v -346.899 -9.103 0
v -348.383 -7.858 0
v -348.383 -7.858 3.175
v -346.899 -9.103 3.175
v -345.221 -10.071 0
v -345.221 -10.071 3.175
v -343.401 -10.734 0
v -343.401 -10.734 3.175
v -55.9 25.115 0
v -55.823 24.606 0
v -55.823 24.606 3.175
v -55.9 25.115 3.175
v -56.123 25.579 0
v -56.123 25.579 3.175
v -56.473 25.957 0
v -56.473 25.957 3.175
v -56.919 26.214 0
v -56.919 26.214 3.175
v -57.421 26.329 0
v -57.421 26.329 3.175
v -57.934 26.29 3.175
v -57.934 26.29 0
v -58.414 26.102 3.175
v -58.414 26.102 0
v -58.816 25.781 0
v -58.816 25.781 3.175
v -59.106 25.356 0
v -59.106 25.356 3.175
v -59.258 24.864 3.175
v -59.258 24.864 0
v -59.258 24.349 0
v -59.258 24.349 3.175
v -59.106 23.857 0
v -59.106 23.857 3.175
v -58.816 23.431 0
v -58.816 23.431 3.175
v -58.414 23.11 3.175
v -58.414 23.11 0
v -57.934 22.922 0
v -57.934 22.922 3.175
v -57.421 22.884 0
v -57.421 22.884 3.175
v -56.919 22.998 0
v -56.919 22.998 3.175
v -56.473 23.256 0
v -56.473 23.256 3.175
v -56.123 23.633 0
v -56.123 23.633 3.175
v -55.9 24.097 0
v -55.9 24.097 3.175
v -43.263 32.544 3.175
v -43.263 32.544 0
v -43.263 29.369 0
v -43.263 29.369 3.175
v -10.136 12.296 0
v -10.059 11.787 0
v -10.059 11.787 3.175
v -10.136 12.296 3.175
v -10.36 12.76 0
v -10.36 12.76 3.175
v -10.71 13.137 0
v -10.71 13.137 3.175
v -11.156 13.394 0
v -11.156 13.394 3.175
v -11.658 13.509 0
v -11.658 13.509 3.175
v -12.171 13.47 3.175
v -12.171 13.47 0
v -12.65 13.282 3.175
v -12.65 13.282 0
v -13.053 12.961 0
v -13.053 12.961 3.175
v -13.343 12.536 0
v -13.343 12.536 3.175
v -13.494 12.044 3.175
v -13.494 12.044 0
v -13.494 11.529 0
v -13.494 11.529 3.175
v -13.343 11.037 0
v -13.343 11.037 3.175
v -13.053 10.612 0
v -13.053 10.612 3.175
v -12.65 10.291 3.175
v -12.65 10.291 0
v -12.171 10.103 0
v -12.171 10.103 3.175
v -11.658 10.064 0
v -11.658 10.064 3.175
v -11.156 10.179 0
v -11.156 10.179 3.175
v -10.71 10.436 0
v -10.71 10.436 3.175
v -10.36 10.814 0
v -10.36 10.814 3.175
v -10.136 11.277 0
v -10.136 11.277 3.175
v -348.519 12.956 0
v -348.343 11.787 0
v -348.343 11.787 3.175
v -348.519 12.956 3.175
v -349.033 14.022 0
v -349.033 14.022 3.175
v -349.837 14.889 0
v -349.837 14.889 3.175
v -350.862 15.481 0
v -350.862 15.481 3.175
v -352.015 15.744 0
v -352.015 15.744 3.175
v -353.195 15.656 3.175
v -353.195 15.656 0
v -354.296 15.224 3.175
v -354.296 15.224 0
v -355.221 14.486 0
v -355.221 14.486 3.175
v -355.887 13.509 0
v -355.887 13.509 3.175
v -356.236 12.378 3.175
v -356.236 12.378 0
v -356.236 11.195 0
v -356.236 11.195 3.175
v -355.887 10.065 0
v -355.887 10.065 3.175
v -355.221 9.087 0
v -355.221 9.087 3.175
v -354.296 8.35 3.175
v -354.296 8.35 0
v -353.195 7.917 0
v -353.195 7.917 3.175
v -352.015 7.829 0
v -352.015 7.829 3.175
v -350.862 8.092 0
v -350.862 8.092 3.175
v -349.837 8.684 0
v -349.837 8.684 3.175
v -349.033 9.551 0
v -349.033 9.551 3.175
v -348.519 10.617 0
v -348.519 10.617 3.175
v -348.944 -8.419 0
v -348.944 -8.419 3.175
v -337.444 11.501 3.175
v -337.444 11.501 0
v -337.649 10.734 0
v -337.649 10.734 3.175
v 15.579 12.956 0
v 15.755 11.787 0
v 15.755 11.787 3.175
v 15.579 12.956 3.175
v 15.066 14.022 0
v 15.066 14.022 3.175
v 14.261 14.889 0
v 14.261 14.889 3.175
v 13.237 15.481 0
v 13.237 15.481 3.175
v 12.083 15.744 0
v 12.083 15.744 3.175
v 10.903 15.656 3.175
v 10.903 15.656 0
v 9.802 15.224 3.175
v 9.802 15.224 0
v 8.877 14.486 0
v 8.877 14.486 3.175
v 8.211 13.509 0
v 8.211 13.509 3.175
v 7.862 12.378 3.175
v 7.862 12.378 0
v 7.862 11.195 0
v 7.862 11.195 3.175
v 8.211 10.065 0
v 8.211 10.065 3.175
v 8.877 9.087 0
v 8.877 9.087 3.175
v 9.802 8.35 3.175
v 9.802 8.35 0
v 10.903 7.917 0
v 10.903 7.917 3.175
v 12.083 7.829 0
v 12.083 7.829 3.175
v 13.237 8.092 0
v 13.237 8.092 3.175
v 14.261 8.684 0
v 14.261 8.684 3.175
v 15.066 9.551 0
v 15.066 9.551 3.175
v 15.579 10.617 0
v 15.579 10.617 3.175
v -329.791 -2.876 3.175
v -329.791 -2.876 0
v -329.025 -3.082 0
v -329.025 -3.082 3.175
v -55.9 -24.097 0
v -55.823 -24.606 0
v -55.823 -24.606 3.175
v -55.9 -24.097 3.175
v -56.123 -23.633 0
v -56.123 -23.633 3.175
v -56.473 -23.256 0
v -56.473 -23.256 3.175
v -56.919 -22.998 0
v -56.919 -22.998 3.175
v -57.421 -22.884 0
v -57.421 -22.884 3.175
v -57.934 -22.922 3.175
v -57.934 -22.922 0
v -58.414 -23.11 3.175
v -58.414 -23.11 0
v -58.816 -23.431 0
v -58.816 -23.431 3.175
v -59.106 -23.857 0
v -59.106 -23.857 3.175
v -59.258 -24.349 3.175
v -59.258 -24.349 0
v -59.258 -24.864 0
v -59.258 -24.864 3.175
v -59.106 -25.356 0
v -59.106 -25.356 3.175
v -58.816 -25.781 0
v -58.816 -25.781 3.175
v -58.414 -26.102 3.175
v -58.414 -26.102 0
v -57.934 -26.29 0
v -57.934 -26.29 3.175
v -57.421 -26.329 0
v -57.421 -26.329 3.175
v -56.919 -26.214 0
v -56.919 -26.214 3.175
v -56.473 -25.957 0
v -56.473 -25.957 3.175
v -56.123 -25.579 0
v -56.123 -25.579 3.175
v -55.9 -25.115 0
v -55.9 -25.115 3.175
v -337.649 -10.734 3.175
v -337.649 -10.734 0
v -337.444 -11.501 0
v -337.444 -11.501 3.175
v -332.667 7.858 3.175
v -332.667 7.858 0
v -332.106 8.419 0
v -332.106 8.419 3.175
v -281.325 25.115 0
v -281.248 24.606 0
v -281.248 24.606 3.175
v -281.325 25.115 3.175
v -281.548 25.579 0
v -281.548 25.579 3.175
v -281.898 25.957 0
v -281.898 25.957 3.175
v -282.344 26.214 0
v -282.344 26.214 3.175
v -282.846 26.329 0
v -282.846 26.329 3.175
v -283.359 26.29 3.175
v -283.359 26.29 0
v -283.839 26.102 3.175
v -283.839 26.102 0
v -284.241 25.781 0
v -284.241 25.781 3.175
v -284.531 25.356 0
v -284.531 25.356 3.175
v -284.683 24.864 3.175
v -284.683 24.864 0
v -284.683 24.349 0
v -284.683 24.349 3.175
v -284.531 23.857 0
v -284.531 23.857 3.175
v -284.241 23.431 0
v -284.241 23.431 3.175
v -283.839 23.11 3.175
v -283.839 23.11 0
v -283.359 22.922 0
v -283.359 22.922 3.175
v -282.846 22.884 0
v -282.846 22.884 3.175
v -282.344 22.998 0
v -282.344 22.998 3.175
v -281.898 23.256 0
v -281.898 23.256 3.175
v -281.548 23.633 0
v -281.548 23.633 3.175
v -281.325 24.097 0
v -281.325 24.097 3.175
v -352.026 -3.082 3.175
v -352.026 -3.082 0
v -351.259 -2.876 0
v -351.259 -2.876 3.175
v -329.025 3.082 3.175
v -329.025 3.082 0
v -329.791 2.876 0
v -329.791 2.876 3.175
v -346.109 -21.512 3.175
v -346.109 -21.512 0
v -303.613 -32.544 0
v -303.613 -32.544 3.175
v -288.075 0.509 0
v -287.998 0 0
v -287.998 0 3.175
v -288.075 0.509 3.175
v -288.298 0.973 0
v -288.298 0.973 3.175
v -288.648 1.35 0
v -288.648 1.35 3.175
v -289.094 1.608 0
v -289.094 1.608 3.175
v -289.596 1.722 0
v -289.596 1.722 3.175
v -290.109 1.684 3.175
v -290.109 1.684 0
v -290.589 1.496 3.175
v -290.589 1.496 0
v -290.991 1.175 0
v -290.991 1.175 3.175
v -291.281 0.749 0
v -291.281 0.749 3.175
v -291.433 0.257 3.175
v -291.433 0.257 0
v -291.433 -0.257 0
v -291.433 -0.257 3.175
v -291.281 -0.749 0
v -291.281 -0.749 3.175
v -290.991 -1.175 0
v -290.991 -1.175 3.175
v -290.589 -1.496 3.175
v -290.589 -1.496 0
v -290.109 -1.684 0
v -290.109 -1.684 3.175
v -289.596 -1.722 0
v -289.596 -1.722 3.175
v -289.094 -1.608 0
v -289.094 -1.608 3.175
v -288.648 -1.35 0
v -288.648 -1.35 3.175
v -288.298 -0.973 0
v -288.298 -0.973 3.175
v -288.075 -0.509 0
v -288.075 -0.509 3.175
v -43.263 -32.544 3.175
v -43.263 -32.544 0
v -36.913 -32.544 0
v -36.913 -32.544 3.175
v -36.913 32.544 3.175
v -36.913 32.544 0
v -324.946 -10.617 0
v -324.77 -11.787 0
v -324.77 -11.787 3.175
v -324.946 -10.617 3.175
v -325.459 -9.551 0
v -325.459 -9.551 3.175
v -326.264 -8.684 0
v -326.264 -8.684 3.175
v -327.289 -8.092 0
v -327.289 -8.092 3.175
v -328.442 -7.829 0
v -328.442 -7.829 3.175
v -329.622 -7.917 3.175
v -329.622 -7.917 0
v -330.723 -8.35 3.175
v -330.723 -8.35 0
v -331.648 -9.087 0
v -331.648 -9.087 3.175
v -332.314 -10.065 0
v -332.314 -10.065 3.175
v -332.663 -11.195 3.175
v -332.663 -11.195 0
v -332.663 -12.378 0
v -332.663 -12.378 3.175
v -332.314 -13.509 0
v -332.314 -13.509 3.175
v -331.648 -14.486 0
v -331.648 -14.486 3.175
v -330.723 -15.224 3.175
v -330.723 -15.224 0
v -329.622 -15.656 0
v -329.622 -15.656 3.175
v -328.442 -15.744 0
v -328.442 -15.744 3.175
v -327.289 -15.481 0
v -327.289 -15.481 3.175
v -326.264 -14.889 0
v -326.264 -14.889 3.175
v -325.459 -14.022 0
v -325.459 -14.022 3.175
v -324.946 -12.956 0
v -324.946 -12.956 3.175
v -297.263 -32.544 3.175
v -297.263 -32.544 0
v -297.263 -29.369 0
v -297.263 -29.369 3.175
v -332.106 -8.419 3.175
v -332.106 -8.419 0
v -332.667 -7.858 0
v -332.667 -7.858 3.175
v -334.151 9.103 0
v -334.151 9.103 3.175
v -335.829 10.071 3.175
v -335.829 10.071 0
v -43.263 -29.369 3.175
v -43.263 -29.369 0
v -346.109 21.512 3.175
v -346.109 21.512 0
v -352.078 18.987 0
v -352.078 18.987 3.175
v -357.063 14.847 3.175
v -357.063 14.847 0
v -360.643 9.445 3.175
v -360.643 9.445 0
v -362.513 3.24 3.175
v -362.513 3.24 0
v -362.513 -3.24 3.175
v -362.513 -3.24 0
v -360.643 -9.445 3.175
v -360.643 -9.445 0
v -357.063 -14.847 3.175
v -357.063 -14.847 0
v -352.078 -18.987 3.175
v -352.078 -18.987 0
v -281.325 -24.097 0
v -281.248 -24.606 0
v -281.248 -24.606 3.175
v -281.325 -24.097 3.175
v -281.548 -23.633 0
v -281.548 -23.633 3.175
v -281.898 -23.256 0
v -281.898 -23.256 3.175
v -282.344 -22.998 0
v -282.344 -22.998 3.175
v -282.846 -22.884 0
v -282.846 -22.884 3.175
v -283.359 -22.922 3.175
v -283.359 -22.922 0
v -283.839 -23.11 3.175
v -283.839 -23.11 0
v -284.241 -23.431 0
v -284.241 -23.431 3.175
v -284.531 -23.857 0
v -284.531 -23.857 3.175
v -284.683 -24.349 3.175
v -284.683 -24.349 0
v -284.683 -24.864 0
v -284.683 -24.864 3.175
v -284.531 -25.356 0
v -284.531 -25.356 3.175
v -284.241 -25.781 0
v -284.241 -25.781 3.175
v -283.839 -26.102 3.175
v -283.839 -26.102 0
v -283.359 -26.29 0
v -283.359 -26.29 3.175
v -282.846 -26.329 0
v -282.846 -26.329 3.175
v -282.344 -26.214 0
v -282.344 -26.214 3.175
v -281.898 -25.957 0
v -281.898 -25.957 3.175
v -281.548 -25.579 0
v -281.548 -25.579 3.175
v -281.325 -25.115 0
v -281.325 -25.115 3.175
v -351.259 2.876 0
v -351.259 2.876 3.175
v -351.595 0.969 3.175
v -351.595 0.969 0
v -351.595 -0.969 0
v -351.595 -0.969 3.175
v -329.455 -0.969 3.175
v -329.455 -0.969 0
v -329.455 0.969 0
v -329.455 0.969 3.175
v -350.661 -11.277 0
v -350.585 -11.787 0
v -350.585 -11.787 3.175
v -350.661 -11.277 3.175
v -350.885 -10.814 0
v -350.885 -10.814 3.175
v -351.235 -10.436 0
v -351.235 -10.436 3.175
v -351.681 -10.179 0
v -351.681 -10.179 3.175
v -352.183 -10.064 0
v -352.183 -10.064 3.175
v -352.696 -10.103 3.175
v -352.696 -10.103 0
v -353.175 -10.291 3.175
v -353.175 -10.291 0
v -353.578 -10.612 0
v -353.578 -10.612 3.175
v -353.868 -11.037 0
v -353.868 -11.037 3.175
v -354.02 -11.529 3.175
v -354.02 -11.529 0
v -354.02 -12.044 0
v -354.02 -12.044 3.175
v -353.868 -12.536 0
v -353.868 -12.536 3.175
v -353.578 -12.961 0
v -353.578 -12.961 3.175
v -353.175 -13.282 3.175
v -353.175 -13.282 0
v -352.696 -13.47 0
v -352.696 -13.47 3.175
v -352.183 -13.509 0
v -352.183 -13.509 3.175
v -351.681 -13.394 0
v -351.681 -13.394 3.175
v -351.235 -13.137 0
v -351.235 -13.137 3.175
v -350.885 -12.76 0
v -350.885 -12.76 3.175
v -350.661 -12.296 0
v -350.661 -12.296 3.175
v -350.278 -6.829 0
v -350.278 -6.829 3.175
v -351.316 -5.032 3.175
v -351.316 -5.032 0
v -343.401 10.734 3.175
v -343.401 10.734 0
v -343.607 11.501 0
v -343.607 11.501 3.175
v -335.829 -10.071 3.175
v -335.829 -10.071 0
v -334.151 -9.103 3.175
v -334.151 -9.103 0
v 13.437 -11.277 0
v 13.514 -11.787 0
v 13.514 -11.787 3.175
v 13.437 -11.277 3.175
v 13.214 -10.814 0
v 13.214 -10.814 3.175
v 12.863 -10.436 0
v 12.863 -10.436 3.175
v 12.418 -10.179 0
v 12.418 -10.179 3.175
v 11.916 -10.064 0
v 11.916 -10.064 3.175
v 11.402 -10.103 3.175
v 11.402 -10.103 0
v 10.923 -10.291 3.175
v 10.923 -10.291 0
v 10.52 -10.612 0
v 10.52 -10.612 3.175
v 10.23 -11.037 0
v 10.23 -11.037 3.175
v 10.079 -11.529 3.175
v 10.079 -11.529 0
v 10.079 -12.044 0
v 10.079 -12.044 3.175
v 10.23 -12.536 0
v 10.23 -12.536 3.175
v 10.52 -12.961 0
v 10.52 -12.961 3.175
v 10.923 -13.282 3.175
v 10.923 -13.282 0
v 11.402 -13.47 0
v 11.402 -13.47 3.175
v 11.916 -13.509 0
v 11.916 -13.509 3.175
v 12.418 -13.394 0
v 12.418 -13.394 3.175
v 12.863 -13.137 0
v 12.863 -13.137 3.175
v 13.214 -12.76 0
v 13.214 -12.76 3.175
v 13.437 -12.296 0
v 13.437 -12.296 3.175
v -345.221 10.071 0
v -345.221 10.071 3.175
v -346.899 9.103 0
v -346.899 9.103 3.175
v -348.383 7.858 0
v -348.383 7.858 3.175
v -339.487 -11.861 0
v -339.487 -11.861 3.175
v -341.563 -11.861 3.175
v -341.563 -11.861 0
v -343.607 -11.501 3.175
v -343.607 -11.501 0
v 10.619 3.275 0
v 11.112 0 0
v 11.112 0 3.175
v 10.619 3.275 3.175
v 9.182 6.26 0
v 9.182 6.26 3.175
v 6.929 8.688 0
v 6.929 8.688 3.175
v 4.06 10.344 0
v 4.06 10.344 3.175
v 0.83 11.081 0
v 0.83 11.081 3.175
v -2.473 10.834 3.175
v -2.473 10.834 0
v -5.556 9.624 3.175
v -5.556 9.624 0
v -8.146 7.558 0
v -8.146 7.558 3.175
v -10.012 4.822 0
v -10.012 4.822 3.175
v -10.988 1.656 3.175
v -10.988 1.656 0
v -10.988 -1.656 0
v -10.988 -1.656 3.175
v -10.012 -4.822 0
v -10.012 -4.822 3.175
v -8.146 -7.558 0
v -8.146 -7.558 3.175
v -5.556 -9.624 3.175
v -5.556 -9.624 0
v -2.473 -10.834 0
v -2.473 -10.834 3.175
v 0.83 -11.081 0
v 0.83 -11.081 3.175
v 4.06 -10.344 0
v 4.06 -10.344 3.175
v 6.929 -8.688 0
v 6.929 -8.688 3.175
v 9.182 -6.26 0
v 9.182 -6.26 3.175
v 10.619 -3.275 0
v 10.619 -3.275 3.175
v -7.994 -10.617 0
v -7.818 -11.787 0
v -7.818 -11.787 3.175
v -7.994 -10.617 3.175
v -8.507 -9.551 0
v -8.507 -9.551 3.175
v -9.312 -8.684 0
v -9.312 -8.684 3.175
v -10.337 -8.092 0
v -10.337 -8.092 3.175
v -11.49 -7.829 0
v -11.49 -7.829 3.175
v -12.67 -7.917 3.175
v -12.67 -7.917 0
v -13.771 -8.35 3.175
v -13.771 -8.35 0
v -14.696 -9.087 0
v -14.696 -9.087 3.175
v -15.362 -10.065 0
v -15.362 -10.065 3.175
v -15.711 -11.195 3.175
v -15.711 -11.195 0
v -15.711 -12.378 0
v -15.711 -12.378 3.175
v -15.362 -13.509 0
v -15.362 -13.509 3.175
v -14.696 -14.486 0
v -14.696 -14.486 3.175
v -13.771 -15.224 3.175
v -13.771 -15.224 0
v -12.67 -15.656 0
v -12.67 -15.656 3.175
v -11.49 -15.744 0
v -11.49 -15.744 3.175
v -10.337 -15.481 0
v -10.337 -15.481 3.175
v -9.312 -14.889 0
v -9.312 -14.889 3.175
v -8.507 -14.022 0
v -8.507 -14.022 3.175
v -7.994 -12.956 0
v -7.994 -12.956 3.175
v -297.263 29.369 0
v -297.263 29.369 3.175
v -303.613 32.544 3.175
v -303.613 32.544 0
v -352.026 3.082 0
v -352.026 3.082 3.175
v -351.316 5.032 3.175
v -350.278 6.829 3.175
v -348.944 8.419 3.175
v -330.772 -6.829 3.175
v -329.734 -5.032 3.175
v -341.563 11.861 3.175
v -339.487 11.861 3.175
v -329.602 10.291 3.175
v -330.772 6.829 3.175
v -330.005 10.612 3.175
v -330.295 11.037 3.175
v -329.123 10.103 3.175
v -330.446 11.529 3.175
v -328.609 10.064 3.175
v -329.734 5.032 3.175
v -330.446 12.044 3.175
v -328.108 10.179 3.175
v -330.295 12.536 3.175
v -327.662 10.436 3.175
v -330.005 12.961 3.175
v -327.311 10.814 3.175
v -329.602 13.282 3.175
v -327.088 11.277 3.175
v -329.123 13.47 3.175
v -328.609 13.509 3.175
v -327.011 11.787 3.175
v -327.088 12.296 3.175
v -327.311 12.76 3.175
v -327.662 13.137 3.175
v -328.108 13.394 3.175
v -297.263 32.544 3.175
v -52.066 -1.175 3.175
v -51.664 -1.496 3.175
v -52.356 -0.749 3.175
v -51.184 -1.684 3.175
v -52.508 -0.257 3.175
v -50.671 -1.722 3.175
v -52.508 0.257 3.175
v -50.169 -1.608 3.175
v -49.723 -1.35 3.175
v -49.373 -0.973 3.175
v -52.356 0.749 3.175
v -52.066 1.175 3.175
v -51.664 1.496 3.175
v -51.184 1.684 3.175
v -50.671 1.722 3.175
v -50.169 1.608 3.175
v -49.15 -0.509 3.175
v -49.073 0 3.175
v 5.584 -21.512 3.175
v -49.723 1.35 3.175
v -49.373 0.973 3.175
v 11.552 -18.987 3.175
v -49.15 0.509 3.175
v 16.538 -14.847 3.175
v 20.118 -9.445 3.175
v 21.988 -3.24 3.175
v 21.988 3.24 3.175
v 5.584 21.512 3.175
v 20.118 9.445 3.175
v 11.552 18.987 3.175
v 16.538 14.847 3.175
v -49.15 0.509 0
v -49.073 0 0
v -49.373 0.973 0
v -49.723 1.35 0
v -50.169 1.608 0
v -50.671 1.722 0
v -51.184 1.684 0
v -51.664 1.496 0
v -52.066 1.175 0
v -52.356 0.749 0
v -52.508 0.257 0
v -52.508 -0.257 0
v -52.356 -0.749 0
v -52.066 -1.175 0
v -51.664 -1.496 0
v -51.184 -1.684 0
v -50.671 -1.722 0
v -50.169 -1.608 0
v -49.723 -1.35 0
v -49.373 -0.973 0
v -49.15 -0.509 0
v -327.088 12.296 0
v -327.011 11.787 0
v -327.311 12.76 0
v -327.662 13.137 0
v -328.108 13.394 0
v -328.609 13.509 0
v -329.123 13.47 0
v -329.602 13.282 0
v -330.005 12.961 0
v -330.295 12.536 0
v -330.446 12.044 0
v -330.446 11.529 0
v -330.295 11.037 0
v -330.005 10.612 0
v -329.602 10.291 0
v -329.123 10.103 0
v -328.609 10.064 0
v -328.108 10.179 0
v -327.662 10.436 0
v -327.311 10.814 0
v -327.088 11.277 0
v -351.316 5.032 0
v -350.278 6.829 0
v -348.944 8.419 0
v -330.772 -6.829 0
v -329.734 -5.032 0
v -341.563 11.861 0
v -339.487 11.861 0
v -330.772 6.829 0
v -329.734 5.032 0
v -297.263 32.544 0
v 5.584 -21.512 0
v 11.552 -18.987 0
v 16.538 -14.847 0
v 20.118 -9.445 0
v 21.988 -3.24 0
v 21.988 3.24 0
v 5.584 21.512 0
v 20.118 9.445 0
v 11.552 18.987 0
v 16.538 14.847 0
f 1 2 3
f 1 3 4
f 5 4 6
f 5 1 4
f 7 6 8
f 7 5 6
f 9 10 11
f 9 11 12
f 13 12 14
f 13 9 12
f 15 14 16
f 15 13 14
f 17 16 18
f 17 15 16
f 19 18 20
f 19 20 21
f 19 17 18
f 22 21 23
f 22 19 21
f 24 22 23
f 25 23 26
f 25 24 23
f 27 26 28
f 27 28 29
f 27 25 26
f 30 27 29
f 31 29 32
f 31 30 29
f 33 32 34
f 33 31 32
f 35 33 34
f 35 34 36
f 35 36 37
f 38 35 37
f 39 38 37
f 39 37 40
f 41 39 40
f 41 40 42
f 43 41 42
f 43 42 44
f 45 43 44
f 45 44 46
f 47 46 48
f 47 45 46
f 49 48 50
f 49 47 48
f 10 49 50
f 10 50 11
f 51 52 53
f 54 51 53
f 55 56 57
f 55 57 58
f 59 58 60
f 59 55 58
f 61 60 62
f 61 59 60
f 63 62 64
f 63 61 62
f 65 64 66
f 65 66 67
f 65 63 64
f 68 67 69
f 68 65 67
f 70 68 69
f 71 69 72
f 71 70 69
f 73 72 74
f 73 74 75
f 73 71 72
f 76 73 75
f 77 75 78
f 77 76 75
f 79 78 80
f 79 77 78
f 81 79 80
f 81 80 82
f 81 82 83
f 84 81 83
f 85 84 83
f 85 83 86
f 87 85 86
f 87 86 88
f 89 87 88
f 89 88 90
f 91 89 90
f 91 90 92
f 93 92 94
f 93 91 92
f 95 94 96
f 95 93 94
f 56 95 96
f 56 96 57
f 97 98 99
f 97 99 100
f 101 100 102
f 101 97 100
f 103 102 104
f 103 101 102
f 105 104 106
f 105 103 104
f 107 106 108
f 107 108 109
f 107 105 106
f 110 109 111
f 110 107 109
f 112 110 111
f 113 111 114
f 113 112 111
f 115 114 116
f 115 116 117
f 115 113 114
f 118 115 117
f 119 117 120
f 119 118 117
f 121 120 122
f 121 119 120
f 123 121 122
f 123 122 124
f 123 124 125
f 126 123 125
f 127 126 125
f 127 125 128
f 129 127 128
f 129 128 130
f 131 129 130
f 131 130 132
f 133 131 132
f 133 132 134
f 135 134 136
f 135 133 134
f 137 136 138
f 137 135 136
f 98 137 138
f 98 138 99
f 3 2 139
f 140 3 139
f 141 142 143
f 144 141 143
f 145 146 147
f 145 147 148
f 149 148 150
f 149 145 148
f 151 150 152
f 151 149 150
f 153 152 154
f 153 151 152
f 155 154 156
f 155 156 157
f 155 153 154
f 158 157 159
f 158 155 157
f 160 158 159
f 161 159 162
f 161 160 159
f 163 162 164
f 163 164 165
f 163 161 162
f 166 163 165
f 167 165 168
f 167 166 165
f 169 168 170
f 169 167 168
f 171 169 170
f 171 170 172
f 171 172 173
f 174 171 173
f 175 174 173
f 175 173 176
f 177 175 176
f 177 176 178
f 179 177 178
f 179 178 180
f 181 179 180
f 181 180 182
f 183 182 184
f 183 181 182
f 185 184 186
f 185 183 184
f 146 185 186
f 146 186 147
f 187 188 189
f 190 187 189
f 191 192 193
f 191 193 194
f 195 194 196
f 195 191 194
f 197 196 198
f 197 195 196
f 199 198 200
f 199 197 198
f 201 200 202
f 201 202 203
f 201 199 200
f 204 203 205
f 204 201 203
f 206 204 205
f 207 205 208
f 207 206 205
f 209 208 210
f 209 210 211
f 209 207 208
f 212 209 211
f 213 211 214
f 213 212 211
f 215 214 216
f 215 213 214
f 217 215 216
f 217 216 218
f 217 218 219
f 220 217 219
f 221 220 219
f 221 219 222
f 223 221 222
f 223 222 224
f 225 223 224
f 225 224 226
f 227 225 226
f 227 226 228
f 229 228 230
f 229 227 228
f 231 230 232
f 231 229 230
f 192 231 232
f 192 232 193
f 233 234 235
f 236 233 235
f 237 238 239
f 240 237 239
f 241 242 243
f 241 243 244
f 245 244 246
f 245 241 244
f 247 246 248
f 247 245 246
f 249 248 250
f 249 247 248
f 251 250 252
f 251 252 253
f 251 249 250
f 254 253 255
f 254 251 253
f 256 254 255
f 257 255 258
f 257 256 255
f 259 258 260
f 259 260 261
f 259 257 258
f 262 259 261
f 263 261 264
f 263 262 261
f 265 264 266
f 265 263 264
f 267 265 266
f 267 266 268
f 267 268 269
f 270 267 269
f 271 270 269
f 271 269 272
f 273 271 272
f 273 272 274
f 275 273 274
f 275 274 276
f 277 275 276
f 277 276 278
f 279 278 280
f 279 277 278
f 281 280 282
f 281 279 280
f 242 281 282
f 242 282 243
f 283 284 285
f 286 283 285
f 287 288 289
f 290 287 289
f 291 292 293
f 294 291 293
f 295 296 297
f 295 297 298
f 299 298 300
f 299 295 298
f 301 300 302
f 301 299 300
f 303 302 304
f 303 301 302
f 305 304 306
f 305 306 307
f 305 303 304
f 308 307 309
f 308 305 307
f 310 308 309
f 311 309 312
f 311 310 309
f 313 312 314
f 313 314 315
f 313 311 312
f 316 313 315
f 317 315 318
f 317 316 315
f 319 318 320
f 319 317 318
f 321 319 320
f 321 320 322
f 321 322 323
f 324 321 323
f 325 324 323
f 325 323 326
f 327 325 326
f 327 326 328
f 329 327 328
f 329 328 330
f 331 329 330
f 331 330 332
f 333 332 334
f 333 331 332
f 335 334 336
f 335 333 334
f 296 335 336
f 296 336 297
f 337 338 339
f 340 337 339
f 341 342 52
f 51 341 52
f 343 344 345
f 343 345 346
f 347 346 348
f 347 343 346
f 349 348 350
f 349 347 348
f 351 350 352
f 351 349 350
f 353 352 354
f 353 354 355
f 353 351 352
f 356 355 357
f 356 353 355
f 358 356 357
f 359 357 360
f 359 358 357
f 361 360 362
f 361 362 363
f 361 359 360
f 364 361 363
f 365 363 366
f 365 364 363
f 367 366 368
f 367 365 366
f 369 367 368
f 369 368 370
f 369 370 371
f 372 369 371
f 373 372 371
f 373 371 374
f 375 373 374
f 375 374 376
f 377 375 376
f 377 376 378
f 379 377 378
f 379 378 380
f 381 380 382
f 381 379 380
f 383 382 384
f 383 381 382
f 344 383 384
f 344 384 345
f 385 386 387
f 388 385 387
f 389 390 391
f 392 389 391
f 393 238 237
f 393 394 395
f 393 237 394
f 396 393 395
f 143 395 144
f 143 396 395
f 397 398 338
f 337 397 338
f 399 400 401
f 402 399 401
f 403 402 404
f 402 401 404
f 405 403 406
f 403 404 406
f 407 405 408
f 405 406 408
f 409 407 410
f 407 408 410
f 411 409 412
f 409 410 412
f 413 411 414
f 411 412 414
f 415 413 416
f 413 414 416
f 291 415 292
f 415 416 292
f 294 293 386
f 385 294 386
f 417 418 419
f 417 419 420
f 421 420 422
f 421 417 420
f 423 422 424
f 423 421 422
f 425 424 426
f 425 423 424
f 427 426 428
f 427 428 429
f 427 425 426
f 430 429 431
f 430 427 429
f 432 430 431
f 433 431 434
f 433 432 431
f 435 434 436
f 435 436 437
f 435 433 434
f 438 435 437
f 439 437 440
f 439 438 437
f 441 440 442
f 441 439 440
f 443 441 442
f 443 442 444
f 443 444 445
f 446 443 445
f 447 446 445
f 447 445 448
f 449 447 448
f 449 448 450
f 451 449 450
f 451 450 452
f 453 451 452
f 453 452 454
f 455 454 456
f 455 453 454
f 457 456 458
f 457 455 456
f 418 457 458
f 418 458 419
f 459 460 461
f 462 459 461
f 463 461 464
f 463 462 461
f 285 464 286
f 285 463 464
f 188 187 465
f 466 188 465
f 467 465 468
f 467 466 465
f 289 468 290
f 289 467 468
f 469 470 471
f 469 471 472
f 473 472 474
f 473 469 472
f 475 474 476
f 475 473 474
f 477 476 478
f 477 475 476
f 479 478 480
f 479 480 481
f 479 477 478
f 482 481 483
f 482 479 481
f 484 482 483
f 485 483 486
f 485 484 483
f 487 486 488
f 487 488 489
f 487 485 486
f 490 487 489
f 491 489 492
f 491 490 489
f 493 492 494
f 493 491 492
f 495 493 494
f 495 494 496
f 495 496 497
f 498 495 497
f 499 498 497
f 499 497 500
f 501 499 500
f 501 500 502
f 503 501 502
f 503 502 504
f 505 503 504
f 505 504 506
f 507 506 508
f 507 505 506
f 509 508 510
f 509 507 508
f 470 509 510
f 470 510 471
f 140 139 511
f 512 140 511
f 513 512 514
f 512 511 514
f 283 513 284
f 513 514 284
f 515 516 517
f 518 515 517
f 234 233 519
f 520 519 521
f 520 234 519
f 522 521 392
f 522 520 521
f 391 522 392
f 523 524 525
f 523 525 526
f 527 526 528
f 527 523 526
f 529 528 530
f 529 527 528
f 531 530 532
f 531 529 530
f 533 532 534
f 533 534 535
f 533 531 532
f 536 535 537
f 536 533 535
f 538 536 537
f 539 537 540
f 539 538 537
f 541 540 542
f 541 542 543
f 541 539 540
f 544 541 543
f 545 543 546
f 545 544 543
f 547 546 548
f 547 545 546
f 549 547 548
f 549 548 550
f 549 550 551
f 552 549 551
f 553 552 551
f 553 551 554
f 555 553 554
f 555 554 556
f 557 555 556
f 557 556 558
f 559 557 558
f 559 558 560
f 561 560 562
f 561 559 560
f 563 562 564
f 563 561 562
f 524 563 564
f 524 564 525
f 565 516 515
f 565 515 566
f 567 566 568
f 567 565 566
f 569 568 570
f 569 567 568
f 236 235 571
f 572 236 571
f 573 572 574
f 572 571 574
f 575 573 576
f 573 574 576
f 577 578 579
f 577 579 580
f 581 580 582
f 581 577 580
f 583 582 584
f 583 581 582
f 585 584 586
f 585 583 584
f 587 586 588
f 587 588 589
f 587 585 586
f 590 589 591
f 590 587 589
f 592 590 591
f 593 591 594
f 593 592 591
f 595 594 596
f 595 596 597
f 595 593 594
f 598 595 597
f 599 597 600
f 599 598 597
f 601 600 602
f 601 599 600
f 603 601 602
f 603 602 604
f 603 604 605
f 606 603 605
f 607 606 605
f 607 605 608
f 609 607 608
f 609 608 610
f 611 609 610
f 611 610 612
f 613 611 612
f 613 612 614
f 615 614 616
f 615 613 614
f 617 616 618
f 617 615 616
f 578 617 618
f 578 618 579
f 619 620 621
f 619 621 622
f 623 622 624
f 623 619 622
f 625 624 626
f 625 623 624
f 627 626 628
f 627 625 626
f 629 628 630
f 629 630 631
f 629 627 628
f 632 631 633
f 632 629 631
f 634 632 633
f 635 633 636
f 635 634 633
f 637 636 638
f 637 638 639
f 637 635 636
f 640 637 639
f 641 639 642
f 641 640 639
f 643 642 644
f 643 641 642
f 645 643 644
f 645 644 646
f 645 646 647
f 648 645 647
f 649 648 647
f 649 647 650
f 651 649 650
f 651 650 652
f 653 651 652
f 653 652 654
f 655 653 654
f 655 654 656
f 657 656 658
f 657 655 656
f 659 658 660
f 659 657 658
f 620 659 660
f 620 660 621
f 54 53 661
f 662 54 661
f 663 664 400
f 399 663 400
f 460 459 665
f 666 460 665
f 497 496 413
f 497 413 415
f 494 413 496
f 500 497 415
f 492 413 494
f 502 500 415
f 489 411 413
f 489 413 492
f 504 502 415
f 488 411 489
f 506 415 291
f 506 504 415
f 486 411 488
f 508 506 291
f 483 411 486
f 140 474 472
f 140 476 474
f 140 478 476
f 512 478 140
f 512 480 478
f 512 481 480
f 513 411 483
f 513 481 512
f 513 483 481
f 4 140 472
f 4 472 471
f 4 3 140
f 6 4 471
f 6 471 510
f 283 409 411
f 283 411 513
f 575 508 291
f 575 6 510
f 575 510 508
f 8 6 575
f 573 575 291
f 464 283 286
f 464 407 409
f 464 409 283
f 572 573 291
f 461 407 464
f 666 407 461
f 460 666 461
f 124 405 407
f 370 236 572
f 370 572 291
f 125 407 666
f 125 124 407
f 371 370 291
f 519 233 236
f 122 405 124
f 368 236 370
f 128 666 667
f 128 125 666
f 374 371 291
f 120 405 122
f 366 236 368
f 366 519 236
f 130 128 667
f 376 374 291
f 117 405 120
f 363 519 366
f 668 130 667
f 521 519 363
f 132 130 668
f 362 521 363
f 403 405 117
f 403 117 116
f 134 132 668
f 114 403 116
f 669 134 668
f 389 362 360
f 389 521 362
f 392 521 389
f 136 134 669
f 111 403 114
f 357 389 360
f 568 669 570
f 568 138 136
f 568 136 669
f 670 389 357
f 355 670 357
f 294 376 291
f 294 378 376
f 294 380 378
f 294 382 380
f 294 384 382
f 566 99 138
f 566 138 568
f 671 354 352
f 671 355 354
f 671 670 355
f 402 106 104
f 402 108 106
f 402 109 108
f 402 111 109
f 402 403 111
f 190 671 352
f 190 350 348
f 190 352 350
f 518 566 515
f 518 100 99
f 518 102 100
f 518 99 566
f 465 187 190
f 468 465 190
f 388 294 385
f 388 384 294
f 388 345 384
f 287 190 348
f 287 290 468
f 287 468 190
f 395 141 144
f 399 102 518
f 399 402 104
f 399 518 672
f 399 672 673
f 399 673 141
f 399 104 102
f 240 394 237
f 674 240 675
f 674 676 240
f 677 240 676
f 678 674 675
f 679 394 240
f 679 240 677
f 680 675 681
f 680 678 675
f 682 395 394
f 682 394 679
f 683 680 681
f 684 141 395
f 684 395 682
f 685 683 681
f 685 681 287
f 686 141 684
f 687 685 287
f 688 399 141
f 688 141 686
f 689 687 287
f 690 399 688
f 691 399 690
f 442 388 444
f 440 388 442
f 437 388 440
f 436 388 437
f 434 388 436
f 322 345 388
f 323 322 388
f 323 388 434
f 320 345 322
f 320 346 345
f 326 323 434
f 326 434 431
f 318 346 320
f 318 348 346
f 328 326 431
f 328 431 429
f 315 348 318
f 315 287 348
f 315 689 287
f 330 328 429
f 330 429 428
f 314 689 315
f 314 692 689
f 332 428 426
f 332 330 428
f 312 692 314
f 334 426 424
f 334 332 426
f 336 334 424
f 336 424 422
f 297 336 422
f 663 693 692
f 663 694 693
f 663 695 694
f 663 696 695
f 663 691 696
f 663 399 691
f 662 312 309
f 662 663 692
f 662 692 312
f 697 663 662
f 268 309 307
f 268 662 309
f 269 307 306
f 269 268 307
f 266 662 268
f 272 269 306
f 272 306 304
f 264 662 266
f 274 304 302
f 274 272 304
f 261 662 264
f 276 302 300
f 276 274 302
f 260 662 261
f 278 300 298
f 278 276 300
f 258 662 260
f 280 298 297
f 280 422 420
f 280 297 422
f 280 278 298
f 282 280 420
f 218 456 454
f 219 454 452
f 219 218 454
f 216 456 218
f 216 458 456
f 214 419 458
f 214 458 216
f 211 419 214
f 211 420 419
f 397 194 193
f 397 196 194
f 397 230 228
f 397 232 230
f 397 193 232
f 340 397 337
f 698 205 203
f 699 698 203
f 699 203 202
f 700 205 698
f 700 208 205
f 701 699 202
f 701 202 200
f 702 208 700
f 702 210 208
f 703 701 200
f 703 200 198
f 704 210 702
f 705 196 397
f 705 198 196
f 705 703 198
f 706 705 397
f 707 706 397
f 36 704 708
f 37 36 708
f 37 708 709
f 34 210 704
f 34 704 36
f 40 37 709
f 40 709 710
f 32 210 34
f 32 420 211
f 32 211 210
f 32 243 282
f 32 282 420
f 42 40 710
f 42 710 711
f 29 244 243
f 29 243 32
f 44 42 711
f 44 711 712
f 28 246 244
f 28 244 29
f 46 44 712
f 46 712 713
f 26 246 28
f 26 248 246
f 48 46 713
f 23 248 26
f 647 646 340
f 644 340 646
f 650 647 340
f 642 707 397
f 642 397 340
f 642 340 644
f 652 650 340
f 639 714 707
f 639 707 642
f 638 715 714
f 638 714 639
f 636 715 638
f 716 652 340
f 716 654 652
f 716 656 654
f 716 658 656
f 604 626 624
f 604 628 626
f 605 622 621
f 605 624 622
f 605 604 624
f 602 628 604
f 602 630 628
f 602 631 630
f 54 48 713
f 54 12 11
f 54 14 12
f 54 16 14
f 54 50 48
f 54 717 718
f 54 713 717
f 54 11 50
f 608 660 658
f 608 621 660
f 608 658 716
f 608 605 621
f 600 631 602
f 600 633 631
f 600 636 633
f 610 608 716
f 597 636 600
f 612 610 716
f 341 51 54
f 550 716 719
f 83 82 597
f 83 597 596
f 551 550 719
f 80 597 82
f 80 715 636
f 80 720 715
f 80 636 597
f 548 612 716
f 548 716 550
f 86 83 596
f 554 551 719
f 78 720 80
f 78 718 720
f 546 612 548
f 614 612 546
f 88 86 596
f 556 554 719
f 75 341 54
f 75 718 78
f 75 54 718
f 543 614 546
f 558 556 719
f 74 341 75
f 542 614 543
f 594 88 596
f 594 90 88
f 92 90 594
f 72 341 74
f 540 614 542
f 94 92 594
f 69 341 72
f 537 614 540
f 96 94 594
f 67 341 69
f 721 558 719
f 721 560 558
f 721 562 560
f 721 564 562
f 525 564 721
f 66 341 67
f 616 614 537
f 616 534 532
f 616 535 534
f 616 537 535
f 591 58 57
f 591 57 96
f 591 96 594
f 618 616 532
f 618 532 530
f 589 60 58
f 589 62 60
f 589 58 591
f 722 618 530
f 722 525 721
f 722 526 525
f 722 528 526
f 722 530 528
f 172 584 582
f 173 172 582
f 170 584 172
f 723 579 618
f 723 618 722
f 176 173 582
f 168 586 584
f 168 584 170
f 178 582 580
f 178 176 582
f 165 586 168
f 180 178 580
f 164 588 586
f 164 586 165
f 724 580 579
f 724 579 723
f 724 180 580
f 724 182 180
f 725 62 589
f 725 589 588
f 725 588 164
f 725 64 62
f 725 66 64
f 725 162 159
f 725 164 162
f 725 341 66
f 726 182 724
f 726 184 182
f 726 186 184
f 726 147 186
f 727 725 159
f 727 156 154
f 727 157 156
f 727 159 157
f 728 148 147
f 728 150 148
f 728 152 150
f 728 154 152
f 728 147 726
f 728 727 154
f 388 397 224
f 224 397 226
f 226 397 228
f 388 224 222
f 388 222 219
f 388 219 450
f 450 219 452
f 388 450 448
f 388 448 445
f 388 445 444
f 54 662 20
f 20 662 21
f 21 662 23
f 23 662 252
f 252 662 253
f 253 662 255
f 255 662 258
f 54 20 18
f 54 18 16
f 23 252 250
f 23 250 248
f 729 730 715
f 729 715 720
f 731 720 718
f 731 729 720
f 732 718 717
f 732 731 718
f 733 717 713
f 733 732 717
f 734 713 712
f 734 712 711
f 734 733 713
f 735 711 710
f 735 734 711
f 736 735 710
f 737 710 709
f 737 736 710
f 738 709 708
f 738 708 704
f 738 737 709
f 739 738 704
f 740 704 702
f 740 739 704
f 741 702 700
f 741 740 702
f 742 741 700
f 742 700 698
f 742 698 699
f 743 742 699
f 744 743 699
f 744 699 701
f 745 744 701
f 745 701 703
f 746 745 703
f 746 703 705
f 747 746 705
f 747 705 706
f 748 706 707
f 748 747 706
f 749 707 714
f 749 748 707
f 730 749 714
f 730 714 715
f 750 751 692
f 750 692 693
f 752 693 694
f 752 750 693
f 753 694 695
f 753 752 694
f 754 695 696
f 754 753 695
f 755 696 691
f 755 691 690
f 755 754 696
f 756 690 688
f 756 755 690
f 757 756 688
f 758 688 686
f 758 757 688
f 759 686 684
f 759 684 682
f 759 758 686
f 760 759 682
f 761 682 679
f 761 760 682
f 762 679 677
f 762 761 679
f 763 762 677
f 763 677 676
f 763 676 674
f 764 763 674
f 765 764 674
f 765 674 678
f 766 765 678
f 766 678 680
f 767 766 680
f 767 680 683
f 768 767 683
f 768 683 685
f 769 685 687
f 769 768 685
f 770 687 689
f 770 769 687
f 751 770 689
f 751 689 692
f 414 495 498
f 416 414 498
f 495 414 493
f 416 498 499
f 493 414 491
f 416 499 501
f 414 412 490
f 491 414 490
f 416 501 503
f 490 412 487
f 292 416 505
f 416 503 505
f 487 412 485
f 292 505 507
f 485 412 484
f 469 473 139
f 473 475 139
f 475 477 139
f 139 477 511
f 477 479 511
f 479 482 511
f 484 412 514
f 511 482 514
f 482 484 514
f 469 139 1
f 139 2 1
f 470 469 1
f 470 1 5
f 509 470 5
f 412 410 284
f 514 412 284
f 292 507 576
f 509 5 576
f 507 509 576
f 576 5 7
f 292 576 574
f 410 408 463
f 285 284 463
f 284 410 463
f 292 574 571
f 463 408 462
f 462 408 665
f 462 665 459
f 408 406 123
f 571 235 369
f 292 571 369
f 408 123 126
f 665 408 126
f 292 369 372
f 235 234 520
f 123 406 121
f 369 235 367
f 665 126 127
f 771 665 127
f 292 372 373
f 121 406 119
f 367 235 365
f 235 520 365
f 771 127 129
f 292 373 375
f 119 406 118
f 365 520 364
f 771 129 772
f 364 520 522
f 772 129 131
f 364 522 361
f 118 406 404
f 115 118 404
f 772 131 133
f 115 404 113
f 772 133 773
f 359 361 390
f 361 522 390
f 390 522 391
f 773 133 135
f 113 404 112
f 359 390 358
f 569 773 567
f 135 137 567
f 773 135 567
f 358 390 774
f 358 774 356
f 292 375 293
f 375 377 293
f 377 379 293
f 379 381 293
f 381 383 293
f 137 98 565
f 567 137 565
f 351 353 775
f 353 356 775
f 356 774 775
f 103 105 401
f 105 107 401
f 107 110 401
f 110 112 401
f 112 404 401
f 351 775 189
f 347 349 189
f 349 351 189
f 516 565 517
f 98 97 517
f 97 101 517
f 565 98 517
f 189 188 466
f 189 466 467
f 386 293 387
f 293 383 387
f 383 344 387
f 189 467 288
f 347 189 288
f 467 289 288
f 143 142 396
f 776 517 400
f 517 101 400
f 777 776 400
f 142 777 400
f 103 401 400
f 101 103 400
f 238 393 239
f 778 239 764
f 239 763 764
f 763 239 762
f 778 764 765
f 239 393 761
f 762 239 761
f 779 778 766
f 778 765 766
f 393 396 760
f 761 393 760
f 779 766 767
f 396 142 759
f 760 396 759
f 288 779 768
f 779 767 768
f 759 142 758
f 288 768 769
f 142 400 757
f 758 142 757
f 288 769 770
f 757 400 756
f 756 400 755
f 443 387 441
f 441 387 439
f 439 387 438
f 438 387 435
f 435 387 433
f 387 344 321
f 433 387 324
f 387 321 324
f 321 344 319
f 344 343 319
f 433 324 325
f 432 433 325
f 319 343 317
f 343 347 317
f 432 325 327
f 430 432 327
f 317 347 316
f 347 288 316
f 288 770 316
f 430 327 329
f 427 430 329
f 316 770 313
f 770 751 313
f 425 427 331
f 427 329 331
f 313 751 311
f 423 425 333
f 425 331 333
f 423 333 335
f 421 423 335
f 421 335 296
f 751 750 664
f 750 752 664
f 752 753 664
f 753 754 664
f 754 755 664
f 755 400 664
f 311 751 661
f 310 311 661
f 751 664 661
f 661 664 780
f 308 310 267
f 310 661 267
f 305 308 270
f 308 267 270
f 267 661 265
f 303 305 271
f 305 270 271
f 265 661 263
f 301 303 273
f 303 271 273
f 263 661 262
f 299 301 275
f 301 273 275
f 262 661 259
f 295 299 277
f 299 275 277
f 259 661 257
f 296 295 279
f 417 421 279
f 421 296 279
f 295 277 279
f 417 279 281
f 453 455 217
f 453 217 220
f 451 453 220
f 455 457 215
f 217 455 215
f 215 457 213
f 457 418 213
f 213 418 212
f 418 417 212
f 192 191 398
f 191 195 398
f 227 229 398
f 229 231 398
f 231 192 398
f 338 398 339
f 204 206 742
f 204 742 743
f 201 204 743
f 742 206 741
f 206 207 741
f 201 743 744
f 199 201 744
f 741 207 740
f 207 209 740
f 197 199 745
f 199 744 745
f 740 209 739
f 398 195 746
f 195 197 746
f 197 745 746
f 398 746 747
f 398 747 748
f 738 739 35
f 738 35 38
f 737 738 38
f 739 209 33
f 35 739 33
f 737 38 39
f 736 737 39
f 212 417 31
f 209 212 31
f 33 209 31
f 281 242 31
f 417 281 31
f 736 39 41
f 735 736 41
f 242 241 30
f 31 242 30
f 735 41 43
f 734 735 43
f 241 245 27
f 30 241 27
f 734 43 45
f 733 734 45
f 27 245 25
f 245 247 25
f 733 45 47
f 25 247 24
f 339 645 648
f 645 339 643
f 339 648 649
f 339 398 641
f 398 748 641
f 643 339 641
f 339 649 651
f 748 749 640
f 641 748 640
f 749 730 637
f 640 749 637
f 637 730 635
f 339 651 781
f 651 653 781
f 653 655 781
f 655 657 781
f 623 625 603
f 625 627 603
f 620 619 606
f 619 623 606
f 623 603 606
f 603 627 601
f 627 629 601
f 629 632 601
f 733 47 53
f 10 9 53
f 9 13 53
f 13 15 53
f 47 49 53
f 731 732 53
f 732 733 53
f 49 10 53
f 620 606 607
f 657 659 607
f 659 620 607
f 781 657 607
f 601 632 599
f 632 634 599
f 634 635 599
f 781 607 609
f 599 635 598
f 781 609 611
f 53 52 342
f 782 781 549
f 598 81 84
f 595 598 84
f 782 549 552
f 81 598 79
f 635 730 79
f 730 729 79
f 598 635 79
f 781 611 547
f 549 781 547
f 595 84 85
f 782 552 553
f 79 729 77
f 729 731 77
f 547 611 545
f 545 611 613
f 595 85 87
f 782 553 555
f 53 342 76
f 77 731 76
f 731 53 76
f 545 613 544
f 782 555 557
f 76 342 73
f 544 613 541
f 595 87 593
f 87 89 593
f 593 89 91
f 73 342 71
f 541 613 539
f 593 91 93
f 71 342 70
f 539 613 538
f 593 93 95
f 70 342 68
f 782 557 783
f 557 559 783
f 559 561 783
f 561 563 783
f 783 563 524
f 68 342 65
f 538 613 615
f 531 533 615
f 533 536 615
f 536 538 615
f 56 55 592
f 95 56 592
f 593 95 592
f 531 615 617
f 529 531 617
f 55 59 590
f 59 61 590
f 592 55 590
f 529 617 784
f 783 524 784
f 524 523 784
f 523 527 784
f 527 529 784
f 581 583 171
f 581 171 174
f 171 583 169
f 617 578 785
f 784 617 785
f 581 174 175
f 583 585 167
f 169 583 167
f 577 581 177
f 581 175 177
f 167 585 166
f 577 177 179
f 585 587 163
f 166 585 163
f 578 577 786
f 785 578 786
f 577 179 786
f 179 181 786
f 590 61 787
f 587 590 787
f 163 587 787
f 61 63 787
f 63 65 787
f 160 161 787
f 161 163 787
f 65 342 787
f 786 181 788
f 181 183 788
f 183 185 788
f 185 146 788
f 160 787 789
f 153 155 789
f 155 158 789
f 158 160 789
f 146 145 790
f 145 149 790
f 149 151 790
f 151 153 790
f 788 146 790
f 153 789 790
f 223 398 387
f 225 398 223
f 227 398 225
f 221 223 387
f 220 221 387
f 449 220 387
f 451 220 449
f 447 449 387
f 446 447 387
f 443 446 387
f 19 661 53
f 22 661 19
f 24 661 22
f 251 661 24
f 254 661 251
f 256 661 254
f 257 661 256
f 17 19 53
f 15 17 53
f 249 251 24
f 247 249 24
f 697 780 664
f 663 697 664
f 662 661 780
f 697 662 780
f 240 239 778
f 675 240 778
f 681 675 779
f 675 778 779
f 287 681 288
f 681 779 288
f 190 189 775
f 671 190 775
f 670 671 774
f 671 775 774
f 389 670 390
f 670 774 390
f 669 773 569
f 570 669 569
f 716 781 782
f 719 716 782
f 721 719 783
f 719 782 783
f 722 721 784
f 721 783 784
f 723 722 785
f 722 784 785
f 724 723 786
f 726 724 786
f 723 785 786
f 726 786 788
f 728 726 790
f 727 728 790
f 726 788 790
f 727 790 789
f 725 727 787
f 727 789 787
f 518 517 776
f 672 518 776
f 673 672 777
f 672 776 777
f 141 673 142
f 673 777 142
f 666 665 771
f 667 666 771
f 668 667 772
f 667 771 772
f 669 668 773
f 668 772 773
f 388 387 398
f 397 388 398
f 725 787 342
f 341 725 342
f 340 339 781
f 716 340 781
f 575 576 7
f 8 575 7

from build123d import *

# Parameters (mm, degrees)
F0_R     = 1.7272
F0_R_2   = 3.96875
F0_R_3   = 11.1125
F1_DEPTH = 3.175
F3_DEPTH = 3.175
F4_COUNT = 6
F4_ANGLE = 300


with BuildPart() as f1:
    # F0 (on Top) → F1 (new body)
    with BuildSketch(Plane.XY):
        with BuildLine():
            Line((-303.6125627, 32.54375), (-346.1094200534, 21.5120031198))
            ThreePointArc((-346.1094200534, 21.5120031198), (-362.7501254, 0), (-346.1094200534, -21.5120031198))
            Line((-346.1094200534, -21.5120031198), (-303.6125627, -32.54375))
            Line((-303.6125627, -32.54375), (-297.2625627, -32.54375))
            Line((-297.2625627, -32.54375), (-297.2625627, -29.36875))
            Line((-297.2625627, -29.36875), (-43.2625627, -29.36875))
            Line((-43.2625627, -29.36875), (-43.2625627, -32.54375))
            Line((-43.2625627, -32.54375), (-36.9125627, -32.54375))
            Line((-36.9125627, -32.54375), (5.5842946534, -21.5120031198))
            ThreePointArc((5.5842946534, -21.5120031198), (22.225, 0), (5.5842946534, 21.5120031198))
            Line((5.5842946534, 21.5120031198), (-36.9125627, 32.54375))
            Line((-36.9125627, 32.54375), (-43.2625627, 32.54375))
            Line((-43.2625627, 32.54375), (-43.2625627, 29.36875))
            Line((-43.2625627, 29.36875), (-297.2625627, 29.36875))
            Line((-297.2625627, 29.36875), (-297.2625627, 32.54375))
            Line((-297.2625627, 32.54375), (-303.6125627, 32.54375))
        make_face()
        with Locations((-282.9750627, -24.60625)):
            Circle(F0_R, mode=Mode.SUBTRACT)
        with Locations((-352.3117115589, -11.7865861589)):
            Circle(F0_R, mode=Mode.SUBTRACT)
        with Locations((-328.7385392411, -11.7865861589)):
            Circle(F0_R_2, mode=Mode.SUBTRACT)
        with Locations((-57.5500627, -24.60625)):
            Circle(F0_R, mode=Mode.SUBTRACT)
        with Locations((-11.7865861589, -11.7865861589)):
            Circle(F0_R_2, mode=Mode.SUBTRACT)
        with Locations((11.7865861589, -11.7865861589)):
            Circle(F0_R, mode=Mode.SUBTRACT)
        with Locations((-340.5251254, 0)):
            Circle(F0_R_3, mode=Mode.SUBTRACT)
        with Locations((-289.7251254, 0)):
            Circle(F0_R, mode=Mode.SUBTRACT)
        with Locations((-352.3117115589, 11.7865861589)):
            Circle(F0_R_2, mode=Mode.SUBTRACT)
        with Locations((-328.7385392411, 11.7865861589)):
            Circle(F0_R, mode=Mode.SUBTRACT)
        with Locations((-282.9750627, 24.60625)):
            Circle(F0_R, mode=Mode.SUBTRACT)
        with Locations((-50.8, 0)):
            Circle(F0_R, mode=Mode.SUBTRACT)
        Circle(F0_R_3, mode=Mode.SUBTRACT)
        with Locations((-11.7865861589, 11.7865861589)):
            Circle(F0_R, mode=Mode.SUBTRACT)
        with Locations((11.7865861589, 11.7865861589)):
            Circle(F0_R_2, mode=Mode.SUBTRACT)
        with Locations((-57.5500627, 24.60625)):
            Circle(F0_R, mode=Mode.SUBTRACT)
    extrude(amount=F1_DEPTH)

    # F2 (on face) → F3 (cut, through all)
    with BuildSketch(Plane(origin=(0, 0, 0), x_dir=(1, 0, 0), z_dir=(0, 0, -1))):
        with BuildLine():
            ThreePointArc((-348.3828495059, -7.8577241059), (-350.1488326996, -5.55625), (-351.2589761446, -2.8761266387))
            Line((-351.2589761446, -2.8761266387), (-352.0256797693, -3.0815642558))
            ThreePointArc((-352.0256797693, -3.0815642558), (-350.8362403638, -5.953125), (-348.9441155135, -8.4189901135))
            Line((-348.9441155135, -8.4189901135), (-348.3828495059, -7.8577241059))
        make_face()
    f3 = extrude(amount=-F3_DEPTH, mode=Mode.SUBTRACT)

    # F4: F3 ×6 about axis
    f4_axis = Axis((-340.5251254, 0, 0), (0, 0, -1))
    for i in range(1, F4_COUNT):
        add(f3.rotate(f4_axis, i * F4_ANGLE / (F4_COUNT - 1)), mode=Mode.SUBTRACT)


solid = f1.part
